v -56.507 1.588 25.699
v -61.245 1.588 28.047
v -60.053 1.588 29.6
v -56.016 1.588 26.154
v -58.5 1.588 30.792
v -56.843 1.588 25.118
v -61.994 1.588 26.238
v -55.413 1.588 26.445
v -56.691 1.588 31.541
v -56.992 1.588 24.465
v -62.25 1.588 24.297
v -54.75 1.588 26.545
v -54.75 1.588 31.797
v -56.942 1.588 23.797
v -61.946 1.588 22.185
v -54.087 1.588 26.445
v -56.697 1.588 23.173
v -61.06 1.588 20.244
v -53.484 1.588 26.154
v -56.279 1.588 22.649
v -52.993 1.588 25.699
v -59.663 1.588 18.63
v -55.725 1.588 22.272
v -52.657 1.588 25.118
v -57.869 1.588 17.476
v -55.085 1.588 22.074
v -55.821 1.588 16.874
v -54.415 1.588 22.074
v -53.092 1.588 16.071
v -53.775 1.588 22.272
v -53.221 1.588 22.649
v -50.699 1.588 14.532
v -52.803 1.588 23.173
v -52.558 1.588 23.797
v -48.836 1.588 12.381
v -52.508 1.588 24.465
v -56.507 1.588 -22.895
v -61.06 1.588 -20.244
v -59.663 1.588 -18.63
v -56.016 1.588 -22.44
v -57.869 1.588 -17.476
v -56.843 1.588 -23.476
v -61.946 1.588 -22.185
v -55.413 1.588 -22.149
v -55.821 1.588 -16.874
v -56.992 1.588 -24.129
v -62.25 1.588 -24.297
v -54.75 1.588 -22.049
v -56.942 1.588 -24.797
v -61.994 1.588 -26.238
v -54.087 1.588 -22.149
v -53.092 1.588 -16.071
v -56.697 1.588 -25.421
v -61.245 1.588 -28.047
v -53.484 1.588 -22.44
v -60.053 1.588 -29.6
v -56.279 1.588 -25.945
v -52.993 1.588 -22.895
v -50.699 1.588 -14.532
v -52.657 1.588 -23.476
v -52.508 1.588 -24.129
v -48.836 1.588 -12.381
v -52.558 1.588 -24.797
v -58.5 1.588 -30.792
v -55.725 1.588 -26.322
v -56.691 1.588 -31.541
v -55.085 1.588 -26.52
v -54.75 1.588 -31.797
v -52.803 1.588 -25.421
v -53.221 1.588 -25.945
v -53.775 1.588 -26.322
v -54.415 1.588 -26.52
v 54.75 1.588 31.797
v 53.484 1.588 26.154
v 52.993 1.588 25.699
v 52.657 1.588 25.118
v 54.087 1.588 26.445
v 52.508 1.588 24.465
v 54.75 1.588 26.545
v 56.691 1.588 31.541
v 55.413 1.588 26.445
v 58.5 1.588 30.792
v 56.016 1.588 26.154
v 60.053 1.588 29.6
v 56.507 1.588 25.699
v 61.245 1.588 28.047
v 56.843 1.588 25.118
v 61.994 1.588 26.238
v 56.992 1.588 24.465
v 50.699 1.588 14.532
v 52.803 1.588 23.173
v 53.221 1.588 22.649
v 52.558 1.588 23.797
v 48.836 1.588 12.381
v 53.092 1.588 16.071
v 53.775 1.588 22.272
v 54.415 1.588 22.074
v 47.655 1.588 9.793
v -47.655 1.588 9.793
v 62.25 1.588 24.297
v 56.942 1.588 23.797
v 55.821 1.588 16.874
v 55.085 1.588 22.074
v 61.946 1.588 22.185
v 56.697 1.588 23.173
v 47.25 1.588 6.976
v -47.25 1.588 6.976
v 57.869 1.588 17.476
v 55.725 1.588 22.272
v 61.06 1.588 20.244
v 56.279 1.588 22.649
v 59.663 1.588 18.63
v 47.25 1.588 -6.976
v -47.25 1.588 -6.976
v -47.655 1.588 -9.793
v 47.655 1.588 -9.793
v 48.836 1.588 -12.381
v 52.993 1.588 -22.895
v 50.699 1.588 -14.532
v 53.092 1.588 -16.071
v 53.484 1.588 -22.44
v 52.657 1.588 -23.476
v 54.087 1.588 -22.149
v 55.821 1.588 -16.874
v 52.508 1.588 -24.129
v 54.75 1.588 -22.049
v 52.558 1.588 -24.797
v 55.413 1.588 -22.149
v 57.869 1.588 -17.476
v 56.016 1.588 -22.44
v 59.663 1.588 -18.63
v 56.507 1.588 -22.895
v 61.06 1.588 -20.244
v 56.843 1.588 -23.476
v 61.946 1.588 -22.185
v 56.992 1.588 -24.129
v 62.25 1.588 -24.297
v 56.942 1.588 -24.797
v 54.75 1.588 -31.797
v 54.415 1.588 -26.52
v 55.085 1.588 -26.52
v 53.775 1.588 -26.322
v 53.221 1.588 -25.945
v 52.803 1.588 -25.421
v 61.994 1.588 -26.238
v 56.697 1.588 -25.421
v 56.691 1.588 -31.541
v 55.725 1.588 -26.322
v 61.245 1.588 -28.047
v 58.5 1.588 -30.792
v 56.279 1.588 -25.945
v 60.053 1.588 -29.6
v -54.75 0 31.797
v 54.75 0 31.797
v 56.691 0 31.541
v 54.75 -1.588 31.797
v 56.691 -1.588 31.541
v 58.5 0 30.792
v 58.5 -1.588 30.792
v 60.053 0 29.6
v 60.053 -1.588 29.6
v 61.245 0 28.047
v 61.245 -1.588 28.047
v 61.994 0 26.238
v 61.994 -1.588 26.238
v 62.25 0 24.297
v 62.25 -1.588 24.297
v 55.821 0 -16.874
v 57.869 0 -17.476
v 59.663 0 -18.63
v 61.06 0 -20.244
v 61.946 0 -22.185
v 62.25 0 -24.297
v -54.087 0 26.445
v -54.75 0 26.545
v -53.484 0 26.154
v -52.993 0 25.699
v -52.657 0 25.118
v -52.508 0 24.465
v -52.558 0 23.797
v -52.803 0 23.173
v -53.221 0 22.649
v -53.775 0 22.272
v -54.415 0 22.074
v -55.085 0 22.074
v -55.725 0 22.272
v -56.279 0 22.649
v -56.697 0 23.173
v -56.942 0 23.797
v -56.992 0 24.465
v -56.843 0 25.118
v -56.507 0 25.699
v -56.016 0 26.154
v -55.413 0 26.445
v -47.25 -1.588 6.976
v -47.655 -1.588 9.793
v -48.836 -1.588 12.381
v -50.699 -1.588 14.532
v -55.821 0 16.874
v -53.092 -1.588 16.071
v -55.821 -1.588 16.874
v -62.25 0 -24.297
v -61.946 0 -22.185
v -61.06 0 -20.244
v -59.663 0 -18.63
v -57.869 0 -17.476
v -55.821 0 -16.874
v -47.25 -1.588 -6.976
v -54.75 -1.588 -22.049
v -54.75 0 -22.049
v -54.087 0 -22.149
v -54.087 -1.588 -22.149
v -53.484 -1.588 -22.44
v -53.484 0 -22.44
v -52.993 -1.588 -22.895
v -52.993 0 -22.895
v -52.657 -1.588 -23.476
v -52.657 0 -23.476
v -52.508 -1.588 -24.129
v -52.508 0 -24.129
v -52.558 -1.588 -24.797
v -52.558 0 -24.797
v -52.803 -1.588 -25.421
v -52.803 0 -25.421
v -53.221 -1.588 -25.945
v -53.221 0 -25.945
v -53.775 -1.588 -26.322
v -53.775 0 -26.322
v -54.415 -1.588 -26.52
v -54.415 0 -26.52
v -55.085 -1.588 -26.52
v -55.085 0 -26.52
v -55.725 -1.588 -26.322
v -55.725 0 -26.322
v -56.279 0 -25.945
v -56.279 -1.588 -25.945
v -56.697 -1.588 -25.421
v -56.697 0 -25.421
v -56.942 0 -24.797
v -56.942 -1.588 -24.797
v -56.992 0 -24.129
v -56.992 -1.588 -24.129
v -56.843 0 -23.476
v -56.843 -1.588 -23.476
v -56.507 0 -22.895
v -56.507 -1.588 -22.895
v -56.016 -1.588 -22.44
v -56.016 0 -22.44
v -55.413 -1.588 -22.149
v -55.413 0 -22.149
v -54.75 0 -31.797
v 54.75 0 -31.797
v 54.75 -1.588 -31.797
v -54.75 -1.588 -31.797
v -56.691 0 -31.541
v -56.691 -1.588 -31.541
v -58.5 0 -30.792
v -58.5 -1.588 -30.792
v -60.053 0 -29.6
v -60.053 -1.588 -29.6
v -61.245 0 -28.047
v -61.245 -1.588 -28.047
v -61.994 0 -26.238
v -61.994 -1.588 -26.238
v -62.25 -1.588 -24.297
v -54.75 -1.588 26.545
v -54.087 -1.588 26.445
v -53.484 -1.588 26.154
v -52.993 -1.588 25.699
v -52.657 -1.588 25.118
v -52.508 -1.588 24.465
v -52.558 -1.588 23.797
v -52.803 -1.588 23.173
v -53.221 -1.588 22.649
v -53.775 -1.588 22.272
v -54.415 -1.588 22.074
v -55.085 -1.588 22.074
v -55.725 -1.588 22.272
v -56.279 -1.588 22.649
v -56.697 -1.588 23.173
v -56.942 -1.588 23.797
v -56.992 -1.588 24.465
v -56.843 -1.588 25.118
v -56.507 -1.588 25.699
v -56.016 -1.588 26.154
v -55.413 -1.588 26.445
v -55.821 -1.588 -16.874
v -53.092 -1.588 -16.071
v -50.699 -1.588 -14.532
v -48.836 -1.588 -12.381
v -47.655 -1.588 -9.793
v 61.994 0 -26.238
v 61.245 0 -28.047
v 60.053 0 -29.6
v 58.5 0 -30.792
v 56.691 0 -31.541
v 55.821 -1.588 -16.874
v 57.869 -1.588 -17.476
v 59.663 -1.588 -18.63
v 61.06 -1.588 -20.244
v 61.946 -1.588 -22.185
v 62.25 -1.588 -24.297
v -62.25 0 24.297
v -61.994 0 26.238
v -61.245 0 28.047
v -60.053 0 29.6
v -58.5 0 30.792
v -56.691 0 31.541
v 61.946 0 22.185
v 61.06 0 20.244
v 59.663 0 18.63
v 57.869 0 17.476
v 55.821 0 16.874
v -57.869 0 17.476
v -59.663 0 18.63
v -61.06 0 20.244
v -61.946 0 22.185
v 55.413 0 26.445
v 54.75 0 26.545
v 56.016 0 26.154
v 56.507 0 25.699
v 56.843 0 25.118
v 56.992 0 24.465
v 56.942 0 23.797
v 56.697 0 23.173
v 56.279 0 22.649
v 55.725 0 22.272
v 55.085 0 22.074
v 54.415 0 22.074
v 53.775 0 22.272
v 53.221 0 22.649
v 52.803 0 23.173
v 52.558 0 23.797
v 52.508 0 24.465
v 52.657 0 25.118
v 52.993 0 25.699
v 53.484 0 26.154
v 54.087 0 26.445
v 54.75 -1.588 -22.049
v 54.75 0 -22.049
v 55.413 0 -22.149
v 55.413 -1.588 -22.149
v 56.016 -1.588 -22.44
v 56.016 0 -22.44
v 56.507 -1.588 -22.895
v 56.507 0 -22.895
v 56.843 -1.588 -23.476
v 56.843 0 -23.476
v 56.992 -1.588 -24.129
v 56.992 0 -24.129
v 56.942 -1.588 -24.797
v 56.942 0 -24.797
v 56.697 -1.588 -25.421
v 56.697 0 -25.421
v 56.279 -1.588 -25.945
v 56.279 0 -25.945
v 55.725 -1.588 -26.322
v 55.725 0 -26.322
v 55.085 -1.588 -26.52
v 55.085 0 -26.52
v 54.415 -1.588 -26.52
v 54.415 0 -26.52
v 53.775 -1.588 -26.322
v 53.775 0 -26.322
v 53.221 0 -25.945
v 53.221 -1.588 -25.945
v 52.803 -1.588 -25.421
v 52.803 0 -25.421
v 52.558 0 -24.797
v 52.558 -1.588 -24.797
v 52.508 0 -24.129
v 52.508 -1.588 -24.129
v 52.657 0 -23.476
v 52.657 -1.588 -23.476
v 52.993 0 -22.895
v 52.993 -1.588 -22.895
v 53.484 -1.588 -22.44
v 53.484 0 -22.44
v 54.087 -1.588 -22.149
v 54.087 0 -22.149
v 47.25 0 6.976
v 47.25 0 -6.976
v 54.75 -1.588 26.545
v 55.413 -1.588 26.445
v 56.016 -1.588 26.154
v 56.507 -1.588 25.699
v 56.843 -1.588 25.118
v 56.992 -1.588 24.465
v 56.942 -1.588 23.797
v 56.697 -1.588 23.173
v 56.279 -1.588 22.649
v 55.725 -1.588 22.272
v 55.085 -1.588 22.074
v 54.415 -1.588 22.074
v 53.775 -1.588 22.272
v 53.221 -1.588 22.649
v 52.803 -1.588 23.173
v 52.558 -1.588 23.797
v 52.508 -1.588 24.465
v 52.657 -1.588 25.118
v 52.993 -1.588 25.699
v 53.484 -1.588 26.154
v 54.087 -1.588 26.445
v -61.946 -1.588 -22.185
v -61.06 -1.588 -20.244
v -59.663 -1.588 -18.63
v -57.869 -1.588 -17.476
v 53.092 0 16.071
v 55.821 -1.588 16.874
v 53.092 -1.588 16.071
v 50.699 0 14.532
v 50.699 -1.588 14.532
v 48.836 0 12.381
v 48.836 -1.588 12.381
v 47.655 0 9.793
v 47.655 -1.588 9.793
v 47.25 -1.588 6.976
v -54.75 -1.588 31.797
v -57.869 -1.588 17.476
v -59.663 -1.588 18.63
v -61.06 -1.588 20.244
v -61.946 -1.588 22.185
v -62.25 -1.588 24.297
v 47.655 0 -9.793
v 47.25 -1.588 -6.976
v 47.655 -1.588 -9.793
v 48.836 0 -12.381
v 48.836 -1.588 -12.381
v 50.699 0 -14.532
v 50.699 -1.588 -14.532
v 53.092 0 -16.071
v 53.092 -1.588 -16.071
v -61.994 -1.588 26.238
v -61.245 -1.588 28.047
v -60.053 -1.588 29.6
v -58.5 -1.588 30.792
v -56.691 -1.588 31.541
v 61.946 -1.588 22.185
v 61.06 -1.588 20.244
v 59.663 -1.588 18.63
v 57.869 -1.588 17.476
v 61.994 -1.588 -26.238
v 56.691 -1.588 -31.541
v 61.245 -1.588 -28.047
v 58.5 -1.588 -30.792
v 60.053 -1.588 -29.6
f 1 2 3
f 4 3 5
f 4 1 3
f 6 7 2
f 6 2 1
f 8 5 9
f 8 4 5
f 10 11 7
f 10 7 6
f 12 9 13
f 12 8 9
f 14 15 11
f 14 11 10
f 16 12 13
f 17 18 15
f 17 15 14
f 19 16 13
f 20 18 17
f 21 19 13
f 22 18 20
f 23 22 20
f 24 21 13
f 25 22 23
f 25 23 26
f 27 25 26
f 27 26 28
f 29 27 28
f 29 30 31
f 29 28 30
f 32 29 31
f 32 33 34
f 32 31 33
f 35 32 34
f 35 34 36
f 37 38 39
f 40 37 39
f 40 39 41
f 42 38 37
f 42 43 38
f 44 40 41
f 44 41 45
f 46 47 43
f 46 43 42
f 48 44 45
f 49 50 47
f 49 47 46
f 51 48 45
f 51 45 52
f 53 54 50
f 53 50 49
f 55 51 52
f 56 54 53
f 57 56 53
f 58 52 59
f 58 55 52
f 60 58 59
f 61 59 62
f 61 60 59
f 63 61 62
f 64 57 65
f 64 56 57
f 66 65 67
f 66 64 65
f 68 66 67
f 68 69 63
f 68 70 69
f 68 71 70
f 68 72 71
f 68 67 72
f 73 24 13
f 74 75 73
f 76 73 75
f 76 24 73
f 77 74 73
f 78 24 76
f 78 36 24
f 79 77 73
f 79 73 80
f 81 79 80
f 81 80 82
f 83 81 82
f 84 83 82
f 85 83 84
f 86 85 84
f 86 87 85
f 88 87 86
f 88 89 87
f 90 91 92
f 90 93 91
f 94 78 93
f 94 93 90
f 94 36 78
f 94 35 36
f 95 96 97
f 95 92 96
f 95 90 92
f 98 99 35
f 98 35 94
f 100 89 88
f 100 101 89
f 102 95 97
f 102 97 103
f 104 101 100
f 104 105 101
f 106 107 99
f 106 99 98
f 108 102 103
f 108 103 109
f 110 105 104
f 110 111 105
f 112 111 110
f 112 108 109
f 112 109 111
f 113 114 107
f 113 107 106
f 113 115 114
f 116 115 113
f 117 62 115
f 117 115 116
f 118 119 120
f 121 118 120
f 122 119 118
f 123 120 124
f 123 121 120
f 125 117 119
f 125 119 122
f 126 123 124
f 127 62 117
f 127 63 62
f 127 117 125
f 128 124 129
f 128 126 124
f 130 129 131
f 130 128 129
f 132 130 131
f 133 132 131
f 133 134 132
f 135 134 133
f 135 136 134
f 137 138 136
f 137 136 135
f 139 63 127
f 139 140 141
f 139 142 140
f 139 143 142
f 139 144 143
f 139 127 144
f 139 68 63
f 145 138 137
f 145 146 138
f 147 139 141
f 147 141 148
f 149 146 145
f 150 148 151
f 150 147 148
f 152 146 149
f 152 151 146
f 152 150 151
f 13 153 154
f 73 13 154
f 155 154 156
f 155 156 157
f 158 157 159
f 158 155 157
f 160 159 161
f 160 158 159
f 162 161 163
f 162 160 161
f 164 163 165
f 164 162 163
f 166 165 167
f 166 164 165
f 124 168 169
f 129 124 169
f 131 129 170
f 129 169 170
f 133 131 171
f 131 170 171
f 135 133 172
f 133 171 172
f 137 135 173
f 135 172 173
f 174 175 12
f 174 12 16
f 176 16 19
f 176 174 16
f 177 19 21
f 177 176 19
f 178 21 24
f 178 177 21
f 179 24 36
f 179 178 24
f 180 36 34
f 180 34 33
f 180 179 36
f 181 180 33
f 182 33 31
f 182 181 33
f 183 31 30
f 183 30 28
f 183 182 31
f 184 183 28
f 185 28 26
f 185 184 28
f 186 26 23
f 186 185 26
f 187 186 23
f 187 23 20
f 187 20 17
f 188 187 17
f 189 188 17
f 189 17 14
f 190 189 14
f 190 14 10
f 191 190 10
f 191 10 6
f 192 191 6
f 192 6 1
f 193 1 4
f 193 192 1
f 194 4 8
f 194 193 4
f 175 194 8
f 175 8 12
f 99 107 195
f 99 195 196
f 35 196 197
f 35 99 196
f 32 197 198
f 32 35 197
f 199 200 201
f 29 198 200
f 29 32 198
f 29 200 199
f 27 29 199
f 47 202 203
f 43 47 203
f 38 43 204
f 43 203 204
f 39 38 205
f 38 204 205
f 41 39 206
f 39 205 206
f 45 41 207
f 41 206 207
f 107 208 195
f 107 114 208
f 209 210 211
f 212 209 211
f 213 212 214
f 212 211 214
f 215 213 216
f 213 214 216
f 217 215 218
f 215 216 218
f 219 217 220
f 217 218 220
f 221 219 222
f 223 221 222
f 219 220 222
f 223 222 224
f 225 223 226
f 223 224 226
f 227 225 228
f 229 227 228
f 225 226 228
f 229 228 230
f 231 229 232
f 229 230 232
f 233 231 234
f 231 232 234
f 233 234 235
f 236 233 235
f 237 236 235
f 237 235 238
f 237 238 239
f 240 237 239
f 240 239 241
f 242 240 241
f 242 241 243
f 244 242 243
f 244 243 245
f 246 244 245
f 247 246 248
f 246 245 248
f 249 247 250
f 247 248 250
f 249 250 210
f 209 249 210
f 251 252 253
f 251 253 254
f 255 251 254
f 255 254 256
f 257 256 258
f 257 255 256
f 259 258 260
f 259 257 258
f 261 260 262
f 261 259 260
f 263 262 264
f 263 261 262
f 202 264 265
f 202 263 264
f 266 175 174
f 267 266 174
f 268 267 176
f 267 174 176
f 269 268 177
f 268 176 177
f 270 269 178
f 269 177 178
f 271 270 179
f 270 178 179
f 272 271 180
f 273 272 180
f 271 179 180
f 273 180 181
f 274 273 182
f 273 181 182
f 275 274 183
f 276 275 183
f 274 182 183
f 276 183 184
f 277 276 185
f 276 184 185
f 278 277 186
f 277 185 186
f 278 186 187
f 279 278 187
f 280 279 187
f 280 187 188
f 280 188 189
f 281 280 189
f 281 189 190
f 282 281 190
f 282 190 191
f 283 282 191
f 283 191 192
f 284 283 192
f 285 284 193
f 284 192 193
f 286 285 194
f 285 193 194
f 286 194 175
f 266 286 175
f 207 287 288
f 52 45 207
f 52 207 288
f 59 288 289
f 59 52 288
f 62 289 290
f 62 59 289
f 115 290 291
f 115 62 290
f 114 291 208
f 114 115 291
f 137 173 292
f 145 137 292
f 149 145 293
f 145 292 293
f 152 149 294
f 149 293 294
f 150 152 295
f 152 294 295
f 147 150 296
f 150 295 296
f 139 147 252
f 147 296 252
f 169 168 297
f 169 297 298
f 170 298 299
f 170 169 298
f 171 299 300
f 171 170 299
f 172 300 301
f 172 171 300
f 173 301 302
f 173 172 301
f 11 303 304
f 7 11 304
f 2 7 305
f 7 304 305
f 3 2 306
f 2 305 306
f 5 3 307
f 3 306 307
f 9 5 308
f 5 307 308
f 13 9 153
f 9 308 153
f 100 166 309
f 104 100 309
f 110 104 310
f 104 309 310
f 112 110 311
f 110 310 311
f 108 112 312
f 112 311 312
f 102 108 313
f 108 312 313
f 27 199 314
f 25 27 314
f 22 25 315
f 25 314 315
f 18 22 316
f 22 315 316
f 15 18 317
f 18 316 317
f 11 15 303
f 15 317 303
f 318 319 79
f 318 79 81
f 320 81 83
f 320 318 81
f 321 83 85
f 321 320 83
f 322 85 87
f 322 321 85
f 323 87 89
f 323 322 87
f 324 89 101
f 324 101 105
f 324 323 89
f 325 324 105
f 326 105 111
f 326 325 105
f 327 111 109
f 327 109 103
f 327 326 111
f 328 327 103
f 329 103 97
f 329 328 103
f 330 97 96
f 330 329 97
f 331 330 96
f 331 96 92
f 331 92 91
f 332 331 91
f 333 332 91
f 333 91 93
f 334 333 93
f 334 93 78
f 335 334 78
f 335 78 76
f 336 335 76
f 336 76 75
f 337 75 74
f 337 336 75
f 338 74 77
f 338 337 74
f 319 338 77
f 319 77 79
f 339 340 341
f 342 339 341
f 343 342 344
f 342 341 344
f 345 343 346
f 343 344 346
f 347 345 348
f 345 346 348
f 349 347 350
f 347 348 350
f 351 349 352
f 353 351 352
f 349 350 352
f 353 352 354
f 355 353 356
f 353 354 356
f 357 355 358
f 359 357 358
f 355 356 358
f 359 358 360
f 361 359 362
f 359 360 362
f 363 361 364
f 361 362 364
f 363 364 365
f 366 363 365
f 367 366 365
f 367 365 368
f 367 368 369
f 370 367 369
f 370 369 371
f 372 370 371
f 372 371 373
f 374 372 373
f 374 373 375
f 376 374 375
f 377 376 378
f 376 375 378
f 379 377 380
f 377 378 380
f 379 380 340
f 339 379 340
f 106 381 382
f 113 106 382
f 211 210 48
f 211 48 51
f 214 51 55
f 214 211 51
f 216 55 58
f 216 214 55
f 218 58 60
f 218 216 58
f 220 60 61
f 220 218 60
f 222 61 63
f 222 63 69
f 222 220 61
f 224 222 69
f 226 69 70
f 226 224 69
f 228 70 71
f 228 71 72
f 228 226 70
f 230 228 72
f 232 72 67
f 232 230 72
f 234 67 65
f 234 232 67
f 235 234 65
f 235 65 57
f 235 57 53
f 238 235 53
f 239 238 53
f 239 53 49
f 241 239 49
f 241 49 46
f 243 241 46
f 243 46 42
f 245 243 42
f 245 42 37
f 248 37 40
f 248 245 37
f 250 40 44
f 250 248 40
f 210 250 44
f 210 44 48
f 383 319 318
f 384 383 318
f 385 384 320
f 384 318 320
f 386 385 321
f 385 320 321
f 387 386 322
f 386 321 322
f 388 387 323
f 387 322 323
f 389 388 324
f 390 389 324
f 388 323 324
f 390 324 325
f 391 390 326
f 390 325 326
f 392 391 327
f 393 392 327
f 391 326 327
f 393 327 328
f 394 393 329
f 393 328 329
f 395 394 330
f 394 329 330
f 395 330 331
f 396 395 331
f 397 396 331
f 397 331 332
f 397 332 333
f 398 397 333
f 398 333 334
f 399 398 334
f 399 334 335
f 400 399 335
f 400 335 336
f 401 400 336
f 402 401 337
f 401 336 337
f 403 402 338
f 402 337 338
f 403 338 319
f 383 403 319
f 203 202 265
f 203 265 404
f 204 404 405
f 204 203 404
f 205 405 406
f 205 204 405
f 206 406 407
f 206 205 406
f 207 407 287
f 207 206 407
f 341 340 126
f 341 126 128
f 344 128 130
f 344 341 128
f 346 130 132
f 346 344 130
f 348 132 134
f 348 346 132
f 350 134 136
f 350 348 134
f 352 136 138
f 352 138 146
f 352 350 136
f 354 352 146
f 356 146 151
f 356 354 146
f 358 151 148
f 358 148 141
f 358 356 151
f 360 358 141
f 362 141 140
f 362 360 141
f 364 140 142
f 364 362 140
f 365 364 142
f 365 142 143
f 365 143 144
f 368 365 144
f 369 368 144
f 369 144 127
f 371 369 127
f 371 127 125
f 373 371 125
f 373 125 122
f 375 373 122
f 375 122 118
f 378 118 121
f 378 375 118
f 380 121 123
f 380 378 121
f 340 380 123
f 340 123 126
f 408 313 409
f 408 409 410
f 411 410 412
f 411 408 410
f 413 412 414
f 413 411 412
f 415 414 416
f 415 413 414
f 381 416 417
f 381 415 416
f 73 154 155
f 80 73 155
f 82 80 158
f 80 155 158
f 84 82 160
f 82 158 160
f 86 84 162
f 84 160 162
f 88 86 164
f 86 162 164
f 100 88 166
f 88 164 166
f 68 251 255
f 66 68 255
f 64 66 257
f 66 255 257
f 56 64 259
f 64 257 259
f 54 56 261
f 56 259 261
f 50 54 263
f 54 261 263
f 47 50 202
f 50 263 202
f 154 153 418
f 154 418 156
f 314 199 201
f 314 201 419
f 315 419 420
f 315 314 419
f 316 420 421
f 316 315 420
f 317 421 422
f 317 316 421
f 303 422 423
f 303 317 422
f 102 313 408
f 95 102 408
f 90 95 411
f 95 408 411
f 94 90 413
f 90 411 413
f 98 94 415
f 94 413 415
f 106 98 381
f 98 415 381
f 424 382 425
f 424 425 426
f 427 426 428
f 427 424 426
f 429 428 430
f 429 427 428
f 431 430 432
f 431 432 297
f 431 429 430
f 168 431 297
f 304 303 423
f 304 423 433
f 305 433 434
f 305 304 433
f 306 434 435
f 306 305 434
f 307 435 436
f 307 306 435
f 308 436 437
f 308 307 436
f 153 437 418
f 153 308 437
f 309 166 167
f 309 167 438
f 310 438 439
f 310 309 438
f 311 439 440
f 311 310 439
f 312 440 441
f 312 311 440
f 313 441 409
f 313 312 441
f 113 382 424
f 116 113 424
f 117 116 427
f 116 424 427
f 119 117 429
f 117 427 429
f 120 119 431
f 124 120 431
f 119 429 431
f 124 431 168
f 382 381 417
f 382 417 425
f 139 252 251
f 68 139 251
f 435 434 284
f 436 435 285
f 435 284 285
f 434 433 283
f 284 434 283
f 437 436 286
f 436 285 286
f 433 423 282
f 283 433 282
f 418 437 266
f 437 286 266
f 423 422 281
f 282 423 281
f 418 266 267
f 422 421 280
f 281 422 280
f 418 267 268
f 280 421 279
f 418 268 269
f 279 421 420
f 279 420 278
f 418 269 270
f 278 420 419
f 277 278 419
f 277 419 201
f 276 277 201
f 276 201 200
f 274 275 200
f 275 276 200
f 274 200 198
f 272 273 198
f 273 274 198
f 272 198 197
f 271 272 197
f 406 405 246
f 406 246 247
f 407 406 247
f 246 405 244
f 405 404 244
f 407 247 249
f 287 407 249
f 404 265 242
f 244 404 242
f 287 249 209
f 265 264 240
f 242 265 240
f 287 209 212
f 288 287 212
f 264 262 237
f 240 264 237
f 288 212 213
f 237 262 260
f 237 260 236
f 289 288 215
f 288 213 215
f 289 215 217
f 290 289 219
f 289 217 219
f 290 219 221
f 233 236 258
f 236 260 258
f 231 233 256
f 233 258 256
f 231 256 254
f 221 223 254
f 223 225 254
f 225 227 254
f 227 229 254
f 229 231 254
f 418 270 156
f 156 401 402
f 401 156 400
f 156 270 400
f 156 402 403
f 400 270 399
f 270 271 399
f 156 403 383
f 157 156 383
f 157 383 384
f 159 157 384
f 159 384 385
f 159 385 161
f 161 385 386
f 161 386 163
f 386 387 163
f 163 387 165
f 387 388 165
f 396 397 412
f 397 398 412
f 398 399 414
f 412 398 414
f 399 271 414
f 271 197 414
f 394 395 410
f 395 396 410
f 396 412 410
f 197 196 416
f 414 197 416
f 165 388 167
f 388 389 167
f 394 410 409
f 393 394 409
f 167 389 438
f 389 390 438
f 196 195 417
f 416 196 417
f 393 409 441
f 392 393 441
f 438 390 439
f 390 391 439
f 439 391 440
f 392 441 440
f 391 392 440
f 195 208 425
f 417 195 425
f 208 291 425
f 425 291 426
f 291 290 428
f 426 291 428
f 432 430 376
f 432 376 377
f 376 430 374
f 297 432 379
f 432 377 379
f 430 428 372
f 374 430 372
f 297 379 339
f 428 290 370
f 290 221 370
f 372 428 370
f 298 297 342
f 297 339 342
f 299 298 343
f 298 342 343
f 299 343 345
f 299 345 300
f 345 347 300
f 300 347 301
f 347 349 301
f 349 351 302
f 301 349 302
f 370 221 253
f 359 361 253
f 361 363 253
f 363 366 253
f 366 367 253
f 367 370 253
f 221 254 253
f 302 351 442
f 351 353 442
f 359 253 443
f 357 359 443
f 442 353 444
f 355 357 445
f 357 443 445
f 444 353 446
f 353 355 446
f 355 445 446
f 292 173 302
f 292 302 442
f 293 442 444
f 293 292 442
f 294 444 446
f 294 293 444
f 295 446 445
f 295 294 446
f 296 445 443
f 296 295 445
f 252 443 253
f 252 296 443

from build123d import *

# Parameters (mm, degrees)
SKETCH1_R           = 2.2479
BOSS_EXTRUDE1_DEPTH = 1.5875


with BuildPart() as part:
    # Sketch1 → Boss-Extrude1 (new, symmetric)
    with BuildSketch(Plane(origin=(0, 0, 0), x_dir=(1, 0, 0), z_dir=(0, 1, 0))):
        with BuildLine():
            Line((-47.25, 6.976491924), (-47.25, -6.976491924))
            ThreePointArc((-47.25, -6.976491924), (-49.69071054, -13.523028631), (-55.821428571, -16.87392511))
            ThreePointArc((-55.821428571, -16.87392511), (-60.419467095, -19.38709747), (-62.25, -24.297))
            ThreePointArc((-62.25, -24.297), (-60.053300859, -29.600300859), (-54.75, -31.797))
            Line((-54.75, -31.797), (54.75, -31.797))
            ThreePointArc((54.75, -31.797), (60.053300859, -29.600300859), (62.25, -24.297))
            ThreePointArc((62.25, -24.297), (60.419467095, -19.38709747), (55.821428571, -16.87392511))
            ThreePointArc((55.821428571, -16.87392511), (49.69071054, -13.523028631), (47.25, -6.976491924))
            Line((47.25, -6.976491924), (47.25, 6.976491924))
            ThreePointArc((47.25, 6.976491924), (49.69071054, 13.523028631), (55.821428571, 16.87392511))
            ThreePointArc((55.821428571, 16.87392511), (60.419467095, 19.38709747), (62.25, 24.297))
            ThreePointArc((62.25, 24.297), (60.053300859, 29.600300859), (54.75, 31.797))
            Line((54.75, 31.797), (-54.75, 31.797))
            ThreePointArc((-54.75, 31.797), (-60.053300859, 29.600300859), (-62.25, 24.297))
            ThreePointArc((-62.25, 24.297), (-60.419467095, 19.38709747), (-55.821428571, 16.87392511))
            ThreePointArc((-55.821428571, 16.87392511), (-49.69071054, 13.523028631), (-47.25, 6.976491924))
        make_face()
        with Locations(Location((54.75, 24.297, 0), (0, 0, 270))):
            Circle(SKETCH1_R, mode=Mode.SUBTRACT)
        with Locations(Location((54.75, -24.297, 0), (0, 0, 270))):
            Circle(SKETCH1_R, mode=Mode.SUBTRACT)
        with Locations(Location((-54.75, -24.297, 0), (0, 0, 270))):
            Circle(SKETCH1_R, mode=Mode.SUBTRACT)
        with Locations(Location((-54.75, 24.297, 0), (0, 0, 270))):
            Circle(SKETCH1_R, mode=Mode.SUBTRACT)
    extrude(amount=BOSS_EXTRUDE1_DEPTH, both=True)


solid = part.part
